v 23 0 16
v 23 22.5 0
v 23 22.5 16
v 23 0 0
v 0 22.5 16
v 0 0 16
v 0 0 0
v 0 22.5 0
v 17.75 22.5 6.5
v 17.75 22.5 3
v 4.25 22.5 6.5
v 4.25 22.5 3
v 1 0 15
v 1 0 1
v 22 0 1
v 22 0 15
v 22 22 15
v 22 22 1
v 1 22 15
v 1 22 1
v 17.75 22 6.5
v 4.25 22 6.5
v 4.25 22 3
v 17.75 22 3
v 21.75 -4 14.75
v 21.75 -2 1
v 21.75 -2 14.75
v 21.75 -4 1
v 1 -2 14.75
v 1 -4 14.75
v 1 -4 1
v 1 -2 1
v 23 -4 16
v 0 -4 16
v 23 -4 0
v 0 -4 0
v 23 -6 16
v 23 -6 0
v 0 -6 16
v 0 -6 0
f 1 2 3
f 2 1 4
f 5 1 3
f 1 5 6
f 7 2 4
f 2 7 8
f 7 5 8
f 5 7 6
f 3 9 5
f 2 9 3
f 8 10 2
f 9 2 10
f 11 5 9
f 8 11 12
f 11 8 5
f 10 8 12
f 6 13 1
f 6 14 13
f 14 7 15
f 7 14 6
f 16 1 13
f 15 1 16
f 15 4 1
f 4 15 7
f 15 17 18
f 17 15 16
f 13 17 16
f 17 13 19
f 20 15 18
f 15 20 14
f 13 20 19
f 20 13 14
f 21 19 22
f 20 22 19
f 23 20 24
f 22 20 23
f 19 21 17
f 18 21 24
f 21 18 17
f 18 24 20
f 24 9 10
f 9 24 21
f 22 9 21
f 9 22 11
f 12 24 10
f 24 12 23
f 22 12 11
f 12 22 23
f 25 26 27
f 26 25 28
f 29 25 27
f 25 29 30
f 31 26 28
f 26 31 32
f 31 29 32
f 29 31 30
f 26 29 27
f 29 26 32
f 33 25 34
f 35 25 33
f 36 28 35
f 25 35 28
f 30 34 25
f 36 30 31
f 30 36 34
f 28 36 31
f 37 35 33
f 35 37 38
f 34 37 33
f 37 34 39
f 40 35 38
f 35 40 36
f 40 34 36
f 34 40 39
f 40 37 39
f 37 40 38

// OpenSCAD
a = 16;//höhe
b = 23;//breite

difference(){
    cube([b, 22.5, a], false);
    translate([1, -1, 1]){
        cube([b-2, 23, a-2], false);
    }
    translate([4.25, 0.25, 3]){
        cube([13.5, 22.5, 3.5], false);
    }
}



//lid
translate([1, -4, 1]){
    cube([b-2.25, 2, a-2.25], false);
}
translate([0, -6, 0]){
    cube([b, 2, a], false);
}

echo("\n\n\t\tThis is a design for a case for the Digispark\n");
